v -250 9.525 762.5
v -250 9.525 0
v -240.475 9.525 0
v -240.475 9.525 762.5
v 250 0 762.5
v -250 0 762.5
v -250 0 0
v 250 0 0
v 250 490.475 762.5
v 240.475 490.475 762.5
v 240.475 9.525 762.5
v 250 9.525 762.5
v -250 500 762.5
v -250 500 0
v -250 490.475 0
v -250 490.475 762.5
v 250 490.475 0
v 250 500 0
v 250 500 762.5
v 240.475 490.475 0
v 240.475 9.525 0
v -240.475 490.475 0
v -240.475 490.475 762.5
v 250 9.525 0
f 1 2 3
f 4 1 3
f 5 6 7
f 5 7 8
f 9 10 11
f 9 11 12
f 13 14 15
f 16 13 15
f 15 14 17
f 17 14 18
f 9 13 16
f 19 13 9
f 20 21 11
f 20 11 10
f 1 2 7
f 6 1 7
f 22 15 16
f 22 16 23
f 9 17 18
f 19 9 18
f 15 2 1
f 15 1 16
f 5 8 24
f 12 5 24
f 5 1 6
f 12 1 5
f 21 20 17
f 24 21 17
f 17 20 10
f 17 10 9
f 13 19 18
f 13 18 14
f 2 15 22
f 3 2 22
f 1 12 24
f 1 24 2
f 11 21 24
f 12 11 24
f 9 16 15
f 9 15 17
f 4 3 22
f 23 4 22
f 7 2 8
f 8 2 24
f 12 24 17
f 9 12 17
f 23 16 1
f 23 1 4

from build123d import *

# Parameters (mm, degrees)
SKETCH1_W             = 9.525
SKETCH1_H             = 480.95
BOSS_EXTRUDE1_DEPTH   = 762.5
BOSS_EXTRUDE1_2_DEPTH = 762.5
BOSS_EXTRUDE2_DEPTH   = 762.5
BOSS_EXTRUDE2_2_DEPTH = 762.5


with BuildPart() as part:
    # Sketch1 → Boss-Extrude1 (new body)
    with BuildSketch(Plane.XY):
        with Locations((-245.2375, 250)):
            Rectangle(SKETCH1_W, SKETCH1_H)
    extrude(amount=BOSS_EXTRUDE1_DEPTH)


with BuildPart() as body_2:
    # Sketch1 → Boss-Extrude1 2 (new body)
    with BuildSketch(Plane.XY):
        with Locations((245.2375, 250)):
            Rectangle(SKETCH1_W, SKETCH1_H)
    extrude(amount=BOSS_EXTRUDE1_2_DEPTH)


with BuildPart() as body_3:
    # Sketch1<3> → Boss-Extrude2 (new body)
    with BuildSketch(Plane.XY):
        Polygon((-250, 490.475), (-240.475, 490.475), (240.475, 490.475), (250, 490.475), (250, 500), (-250, 500), align=None)
    extrude(amount=BOSS_EXTRUDE2_DEPTH)


with BuildPart() as body_4:
    # Sketch1<3> → Boss-Extrude2 2 (new body)
    with BuildSketch(Plane.XY):
        Polygon((240.475, 9.525), (-240.475, 9.525), (-250, 9.525), (-250, 0), (250, 0), (250, 9.525), align=None)
    extrude(amount=BOSS_EXTRUDE2_2_DEPTH)


solid = Compound([part.part, body_2.part, body_3.part, body_4.part])
